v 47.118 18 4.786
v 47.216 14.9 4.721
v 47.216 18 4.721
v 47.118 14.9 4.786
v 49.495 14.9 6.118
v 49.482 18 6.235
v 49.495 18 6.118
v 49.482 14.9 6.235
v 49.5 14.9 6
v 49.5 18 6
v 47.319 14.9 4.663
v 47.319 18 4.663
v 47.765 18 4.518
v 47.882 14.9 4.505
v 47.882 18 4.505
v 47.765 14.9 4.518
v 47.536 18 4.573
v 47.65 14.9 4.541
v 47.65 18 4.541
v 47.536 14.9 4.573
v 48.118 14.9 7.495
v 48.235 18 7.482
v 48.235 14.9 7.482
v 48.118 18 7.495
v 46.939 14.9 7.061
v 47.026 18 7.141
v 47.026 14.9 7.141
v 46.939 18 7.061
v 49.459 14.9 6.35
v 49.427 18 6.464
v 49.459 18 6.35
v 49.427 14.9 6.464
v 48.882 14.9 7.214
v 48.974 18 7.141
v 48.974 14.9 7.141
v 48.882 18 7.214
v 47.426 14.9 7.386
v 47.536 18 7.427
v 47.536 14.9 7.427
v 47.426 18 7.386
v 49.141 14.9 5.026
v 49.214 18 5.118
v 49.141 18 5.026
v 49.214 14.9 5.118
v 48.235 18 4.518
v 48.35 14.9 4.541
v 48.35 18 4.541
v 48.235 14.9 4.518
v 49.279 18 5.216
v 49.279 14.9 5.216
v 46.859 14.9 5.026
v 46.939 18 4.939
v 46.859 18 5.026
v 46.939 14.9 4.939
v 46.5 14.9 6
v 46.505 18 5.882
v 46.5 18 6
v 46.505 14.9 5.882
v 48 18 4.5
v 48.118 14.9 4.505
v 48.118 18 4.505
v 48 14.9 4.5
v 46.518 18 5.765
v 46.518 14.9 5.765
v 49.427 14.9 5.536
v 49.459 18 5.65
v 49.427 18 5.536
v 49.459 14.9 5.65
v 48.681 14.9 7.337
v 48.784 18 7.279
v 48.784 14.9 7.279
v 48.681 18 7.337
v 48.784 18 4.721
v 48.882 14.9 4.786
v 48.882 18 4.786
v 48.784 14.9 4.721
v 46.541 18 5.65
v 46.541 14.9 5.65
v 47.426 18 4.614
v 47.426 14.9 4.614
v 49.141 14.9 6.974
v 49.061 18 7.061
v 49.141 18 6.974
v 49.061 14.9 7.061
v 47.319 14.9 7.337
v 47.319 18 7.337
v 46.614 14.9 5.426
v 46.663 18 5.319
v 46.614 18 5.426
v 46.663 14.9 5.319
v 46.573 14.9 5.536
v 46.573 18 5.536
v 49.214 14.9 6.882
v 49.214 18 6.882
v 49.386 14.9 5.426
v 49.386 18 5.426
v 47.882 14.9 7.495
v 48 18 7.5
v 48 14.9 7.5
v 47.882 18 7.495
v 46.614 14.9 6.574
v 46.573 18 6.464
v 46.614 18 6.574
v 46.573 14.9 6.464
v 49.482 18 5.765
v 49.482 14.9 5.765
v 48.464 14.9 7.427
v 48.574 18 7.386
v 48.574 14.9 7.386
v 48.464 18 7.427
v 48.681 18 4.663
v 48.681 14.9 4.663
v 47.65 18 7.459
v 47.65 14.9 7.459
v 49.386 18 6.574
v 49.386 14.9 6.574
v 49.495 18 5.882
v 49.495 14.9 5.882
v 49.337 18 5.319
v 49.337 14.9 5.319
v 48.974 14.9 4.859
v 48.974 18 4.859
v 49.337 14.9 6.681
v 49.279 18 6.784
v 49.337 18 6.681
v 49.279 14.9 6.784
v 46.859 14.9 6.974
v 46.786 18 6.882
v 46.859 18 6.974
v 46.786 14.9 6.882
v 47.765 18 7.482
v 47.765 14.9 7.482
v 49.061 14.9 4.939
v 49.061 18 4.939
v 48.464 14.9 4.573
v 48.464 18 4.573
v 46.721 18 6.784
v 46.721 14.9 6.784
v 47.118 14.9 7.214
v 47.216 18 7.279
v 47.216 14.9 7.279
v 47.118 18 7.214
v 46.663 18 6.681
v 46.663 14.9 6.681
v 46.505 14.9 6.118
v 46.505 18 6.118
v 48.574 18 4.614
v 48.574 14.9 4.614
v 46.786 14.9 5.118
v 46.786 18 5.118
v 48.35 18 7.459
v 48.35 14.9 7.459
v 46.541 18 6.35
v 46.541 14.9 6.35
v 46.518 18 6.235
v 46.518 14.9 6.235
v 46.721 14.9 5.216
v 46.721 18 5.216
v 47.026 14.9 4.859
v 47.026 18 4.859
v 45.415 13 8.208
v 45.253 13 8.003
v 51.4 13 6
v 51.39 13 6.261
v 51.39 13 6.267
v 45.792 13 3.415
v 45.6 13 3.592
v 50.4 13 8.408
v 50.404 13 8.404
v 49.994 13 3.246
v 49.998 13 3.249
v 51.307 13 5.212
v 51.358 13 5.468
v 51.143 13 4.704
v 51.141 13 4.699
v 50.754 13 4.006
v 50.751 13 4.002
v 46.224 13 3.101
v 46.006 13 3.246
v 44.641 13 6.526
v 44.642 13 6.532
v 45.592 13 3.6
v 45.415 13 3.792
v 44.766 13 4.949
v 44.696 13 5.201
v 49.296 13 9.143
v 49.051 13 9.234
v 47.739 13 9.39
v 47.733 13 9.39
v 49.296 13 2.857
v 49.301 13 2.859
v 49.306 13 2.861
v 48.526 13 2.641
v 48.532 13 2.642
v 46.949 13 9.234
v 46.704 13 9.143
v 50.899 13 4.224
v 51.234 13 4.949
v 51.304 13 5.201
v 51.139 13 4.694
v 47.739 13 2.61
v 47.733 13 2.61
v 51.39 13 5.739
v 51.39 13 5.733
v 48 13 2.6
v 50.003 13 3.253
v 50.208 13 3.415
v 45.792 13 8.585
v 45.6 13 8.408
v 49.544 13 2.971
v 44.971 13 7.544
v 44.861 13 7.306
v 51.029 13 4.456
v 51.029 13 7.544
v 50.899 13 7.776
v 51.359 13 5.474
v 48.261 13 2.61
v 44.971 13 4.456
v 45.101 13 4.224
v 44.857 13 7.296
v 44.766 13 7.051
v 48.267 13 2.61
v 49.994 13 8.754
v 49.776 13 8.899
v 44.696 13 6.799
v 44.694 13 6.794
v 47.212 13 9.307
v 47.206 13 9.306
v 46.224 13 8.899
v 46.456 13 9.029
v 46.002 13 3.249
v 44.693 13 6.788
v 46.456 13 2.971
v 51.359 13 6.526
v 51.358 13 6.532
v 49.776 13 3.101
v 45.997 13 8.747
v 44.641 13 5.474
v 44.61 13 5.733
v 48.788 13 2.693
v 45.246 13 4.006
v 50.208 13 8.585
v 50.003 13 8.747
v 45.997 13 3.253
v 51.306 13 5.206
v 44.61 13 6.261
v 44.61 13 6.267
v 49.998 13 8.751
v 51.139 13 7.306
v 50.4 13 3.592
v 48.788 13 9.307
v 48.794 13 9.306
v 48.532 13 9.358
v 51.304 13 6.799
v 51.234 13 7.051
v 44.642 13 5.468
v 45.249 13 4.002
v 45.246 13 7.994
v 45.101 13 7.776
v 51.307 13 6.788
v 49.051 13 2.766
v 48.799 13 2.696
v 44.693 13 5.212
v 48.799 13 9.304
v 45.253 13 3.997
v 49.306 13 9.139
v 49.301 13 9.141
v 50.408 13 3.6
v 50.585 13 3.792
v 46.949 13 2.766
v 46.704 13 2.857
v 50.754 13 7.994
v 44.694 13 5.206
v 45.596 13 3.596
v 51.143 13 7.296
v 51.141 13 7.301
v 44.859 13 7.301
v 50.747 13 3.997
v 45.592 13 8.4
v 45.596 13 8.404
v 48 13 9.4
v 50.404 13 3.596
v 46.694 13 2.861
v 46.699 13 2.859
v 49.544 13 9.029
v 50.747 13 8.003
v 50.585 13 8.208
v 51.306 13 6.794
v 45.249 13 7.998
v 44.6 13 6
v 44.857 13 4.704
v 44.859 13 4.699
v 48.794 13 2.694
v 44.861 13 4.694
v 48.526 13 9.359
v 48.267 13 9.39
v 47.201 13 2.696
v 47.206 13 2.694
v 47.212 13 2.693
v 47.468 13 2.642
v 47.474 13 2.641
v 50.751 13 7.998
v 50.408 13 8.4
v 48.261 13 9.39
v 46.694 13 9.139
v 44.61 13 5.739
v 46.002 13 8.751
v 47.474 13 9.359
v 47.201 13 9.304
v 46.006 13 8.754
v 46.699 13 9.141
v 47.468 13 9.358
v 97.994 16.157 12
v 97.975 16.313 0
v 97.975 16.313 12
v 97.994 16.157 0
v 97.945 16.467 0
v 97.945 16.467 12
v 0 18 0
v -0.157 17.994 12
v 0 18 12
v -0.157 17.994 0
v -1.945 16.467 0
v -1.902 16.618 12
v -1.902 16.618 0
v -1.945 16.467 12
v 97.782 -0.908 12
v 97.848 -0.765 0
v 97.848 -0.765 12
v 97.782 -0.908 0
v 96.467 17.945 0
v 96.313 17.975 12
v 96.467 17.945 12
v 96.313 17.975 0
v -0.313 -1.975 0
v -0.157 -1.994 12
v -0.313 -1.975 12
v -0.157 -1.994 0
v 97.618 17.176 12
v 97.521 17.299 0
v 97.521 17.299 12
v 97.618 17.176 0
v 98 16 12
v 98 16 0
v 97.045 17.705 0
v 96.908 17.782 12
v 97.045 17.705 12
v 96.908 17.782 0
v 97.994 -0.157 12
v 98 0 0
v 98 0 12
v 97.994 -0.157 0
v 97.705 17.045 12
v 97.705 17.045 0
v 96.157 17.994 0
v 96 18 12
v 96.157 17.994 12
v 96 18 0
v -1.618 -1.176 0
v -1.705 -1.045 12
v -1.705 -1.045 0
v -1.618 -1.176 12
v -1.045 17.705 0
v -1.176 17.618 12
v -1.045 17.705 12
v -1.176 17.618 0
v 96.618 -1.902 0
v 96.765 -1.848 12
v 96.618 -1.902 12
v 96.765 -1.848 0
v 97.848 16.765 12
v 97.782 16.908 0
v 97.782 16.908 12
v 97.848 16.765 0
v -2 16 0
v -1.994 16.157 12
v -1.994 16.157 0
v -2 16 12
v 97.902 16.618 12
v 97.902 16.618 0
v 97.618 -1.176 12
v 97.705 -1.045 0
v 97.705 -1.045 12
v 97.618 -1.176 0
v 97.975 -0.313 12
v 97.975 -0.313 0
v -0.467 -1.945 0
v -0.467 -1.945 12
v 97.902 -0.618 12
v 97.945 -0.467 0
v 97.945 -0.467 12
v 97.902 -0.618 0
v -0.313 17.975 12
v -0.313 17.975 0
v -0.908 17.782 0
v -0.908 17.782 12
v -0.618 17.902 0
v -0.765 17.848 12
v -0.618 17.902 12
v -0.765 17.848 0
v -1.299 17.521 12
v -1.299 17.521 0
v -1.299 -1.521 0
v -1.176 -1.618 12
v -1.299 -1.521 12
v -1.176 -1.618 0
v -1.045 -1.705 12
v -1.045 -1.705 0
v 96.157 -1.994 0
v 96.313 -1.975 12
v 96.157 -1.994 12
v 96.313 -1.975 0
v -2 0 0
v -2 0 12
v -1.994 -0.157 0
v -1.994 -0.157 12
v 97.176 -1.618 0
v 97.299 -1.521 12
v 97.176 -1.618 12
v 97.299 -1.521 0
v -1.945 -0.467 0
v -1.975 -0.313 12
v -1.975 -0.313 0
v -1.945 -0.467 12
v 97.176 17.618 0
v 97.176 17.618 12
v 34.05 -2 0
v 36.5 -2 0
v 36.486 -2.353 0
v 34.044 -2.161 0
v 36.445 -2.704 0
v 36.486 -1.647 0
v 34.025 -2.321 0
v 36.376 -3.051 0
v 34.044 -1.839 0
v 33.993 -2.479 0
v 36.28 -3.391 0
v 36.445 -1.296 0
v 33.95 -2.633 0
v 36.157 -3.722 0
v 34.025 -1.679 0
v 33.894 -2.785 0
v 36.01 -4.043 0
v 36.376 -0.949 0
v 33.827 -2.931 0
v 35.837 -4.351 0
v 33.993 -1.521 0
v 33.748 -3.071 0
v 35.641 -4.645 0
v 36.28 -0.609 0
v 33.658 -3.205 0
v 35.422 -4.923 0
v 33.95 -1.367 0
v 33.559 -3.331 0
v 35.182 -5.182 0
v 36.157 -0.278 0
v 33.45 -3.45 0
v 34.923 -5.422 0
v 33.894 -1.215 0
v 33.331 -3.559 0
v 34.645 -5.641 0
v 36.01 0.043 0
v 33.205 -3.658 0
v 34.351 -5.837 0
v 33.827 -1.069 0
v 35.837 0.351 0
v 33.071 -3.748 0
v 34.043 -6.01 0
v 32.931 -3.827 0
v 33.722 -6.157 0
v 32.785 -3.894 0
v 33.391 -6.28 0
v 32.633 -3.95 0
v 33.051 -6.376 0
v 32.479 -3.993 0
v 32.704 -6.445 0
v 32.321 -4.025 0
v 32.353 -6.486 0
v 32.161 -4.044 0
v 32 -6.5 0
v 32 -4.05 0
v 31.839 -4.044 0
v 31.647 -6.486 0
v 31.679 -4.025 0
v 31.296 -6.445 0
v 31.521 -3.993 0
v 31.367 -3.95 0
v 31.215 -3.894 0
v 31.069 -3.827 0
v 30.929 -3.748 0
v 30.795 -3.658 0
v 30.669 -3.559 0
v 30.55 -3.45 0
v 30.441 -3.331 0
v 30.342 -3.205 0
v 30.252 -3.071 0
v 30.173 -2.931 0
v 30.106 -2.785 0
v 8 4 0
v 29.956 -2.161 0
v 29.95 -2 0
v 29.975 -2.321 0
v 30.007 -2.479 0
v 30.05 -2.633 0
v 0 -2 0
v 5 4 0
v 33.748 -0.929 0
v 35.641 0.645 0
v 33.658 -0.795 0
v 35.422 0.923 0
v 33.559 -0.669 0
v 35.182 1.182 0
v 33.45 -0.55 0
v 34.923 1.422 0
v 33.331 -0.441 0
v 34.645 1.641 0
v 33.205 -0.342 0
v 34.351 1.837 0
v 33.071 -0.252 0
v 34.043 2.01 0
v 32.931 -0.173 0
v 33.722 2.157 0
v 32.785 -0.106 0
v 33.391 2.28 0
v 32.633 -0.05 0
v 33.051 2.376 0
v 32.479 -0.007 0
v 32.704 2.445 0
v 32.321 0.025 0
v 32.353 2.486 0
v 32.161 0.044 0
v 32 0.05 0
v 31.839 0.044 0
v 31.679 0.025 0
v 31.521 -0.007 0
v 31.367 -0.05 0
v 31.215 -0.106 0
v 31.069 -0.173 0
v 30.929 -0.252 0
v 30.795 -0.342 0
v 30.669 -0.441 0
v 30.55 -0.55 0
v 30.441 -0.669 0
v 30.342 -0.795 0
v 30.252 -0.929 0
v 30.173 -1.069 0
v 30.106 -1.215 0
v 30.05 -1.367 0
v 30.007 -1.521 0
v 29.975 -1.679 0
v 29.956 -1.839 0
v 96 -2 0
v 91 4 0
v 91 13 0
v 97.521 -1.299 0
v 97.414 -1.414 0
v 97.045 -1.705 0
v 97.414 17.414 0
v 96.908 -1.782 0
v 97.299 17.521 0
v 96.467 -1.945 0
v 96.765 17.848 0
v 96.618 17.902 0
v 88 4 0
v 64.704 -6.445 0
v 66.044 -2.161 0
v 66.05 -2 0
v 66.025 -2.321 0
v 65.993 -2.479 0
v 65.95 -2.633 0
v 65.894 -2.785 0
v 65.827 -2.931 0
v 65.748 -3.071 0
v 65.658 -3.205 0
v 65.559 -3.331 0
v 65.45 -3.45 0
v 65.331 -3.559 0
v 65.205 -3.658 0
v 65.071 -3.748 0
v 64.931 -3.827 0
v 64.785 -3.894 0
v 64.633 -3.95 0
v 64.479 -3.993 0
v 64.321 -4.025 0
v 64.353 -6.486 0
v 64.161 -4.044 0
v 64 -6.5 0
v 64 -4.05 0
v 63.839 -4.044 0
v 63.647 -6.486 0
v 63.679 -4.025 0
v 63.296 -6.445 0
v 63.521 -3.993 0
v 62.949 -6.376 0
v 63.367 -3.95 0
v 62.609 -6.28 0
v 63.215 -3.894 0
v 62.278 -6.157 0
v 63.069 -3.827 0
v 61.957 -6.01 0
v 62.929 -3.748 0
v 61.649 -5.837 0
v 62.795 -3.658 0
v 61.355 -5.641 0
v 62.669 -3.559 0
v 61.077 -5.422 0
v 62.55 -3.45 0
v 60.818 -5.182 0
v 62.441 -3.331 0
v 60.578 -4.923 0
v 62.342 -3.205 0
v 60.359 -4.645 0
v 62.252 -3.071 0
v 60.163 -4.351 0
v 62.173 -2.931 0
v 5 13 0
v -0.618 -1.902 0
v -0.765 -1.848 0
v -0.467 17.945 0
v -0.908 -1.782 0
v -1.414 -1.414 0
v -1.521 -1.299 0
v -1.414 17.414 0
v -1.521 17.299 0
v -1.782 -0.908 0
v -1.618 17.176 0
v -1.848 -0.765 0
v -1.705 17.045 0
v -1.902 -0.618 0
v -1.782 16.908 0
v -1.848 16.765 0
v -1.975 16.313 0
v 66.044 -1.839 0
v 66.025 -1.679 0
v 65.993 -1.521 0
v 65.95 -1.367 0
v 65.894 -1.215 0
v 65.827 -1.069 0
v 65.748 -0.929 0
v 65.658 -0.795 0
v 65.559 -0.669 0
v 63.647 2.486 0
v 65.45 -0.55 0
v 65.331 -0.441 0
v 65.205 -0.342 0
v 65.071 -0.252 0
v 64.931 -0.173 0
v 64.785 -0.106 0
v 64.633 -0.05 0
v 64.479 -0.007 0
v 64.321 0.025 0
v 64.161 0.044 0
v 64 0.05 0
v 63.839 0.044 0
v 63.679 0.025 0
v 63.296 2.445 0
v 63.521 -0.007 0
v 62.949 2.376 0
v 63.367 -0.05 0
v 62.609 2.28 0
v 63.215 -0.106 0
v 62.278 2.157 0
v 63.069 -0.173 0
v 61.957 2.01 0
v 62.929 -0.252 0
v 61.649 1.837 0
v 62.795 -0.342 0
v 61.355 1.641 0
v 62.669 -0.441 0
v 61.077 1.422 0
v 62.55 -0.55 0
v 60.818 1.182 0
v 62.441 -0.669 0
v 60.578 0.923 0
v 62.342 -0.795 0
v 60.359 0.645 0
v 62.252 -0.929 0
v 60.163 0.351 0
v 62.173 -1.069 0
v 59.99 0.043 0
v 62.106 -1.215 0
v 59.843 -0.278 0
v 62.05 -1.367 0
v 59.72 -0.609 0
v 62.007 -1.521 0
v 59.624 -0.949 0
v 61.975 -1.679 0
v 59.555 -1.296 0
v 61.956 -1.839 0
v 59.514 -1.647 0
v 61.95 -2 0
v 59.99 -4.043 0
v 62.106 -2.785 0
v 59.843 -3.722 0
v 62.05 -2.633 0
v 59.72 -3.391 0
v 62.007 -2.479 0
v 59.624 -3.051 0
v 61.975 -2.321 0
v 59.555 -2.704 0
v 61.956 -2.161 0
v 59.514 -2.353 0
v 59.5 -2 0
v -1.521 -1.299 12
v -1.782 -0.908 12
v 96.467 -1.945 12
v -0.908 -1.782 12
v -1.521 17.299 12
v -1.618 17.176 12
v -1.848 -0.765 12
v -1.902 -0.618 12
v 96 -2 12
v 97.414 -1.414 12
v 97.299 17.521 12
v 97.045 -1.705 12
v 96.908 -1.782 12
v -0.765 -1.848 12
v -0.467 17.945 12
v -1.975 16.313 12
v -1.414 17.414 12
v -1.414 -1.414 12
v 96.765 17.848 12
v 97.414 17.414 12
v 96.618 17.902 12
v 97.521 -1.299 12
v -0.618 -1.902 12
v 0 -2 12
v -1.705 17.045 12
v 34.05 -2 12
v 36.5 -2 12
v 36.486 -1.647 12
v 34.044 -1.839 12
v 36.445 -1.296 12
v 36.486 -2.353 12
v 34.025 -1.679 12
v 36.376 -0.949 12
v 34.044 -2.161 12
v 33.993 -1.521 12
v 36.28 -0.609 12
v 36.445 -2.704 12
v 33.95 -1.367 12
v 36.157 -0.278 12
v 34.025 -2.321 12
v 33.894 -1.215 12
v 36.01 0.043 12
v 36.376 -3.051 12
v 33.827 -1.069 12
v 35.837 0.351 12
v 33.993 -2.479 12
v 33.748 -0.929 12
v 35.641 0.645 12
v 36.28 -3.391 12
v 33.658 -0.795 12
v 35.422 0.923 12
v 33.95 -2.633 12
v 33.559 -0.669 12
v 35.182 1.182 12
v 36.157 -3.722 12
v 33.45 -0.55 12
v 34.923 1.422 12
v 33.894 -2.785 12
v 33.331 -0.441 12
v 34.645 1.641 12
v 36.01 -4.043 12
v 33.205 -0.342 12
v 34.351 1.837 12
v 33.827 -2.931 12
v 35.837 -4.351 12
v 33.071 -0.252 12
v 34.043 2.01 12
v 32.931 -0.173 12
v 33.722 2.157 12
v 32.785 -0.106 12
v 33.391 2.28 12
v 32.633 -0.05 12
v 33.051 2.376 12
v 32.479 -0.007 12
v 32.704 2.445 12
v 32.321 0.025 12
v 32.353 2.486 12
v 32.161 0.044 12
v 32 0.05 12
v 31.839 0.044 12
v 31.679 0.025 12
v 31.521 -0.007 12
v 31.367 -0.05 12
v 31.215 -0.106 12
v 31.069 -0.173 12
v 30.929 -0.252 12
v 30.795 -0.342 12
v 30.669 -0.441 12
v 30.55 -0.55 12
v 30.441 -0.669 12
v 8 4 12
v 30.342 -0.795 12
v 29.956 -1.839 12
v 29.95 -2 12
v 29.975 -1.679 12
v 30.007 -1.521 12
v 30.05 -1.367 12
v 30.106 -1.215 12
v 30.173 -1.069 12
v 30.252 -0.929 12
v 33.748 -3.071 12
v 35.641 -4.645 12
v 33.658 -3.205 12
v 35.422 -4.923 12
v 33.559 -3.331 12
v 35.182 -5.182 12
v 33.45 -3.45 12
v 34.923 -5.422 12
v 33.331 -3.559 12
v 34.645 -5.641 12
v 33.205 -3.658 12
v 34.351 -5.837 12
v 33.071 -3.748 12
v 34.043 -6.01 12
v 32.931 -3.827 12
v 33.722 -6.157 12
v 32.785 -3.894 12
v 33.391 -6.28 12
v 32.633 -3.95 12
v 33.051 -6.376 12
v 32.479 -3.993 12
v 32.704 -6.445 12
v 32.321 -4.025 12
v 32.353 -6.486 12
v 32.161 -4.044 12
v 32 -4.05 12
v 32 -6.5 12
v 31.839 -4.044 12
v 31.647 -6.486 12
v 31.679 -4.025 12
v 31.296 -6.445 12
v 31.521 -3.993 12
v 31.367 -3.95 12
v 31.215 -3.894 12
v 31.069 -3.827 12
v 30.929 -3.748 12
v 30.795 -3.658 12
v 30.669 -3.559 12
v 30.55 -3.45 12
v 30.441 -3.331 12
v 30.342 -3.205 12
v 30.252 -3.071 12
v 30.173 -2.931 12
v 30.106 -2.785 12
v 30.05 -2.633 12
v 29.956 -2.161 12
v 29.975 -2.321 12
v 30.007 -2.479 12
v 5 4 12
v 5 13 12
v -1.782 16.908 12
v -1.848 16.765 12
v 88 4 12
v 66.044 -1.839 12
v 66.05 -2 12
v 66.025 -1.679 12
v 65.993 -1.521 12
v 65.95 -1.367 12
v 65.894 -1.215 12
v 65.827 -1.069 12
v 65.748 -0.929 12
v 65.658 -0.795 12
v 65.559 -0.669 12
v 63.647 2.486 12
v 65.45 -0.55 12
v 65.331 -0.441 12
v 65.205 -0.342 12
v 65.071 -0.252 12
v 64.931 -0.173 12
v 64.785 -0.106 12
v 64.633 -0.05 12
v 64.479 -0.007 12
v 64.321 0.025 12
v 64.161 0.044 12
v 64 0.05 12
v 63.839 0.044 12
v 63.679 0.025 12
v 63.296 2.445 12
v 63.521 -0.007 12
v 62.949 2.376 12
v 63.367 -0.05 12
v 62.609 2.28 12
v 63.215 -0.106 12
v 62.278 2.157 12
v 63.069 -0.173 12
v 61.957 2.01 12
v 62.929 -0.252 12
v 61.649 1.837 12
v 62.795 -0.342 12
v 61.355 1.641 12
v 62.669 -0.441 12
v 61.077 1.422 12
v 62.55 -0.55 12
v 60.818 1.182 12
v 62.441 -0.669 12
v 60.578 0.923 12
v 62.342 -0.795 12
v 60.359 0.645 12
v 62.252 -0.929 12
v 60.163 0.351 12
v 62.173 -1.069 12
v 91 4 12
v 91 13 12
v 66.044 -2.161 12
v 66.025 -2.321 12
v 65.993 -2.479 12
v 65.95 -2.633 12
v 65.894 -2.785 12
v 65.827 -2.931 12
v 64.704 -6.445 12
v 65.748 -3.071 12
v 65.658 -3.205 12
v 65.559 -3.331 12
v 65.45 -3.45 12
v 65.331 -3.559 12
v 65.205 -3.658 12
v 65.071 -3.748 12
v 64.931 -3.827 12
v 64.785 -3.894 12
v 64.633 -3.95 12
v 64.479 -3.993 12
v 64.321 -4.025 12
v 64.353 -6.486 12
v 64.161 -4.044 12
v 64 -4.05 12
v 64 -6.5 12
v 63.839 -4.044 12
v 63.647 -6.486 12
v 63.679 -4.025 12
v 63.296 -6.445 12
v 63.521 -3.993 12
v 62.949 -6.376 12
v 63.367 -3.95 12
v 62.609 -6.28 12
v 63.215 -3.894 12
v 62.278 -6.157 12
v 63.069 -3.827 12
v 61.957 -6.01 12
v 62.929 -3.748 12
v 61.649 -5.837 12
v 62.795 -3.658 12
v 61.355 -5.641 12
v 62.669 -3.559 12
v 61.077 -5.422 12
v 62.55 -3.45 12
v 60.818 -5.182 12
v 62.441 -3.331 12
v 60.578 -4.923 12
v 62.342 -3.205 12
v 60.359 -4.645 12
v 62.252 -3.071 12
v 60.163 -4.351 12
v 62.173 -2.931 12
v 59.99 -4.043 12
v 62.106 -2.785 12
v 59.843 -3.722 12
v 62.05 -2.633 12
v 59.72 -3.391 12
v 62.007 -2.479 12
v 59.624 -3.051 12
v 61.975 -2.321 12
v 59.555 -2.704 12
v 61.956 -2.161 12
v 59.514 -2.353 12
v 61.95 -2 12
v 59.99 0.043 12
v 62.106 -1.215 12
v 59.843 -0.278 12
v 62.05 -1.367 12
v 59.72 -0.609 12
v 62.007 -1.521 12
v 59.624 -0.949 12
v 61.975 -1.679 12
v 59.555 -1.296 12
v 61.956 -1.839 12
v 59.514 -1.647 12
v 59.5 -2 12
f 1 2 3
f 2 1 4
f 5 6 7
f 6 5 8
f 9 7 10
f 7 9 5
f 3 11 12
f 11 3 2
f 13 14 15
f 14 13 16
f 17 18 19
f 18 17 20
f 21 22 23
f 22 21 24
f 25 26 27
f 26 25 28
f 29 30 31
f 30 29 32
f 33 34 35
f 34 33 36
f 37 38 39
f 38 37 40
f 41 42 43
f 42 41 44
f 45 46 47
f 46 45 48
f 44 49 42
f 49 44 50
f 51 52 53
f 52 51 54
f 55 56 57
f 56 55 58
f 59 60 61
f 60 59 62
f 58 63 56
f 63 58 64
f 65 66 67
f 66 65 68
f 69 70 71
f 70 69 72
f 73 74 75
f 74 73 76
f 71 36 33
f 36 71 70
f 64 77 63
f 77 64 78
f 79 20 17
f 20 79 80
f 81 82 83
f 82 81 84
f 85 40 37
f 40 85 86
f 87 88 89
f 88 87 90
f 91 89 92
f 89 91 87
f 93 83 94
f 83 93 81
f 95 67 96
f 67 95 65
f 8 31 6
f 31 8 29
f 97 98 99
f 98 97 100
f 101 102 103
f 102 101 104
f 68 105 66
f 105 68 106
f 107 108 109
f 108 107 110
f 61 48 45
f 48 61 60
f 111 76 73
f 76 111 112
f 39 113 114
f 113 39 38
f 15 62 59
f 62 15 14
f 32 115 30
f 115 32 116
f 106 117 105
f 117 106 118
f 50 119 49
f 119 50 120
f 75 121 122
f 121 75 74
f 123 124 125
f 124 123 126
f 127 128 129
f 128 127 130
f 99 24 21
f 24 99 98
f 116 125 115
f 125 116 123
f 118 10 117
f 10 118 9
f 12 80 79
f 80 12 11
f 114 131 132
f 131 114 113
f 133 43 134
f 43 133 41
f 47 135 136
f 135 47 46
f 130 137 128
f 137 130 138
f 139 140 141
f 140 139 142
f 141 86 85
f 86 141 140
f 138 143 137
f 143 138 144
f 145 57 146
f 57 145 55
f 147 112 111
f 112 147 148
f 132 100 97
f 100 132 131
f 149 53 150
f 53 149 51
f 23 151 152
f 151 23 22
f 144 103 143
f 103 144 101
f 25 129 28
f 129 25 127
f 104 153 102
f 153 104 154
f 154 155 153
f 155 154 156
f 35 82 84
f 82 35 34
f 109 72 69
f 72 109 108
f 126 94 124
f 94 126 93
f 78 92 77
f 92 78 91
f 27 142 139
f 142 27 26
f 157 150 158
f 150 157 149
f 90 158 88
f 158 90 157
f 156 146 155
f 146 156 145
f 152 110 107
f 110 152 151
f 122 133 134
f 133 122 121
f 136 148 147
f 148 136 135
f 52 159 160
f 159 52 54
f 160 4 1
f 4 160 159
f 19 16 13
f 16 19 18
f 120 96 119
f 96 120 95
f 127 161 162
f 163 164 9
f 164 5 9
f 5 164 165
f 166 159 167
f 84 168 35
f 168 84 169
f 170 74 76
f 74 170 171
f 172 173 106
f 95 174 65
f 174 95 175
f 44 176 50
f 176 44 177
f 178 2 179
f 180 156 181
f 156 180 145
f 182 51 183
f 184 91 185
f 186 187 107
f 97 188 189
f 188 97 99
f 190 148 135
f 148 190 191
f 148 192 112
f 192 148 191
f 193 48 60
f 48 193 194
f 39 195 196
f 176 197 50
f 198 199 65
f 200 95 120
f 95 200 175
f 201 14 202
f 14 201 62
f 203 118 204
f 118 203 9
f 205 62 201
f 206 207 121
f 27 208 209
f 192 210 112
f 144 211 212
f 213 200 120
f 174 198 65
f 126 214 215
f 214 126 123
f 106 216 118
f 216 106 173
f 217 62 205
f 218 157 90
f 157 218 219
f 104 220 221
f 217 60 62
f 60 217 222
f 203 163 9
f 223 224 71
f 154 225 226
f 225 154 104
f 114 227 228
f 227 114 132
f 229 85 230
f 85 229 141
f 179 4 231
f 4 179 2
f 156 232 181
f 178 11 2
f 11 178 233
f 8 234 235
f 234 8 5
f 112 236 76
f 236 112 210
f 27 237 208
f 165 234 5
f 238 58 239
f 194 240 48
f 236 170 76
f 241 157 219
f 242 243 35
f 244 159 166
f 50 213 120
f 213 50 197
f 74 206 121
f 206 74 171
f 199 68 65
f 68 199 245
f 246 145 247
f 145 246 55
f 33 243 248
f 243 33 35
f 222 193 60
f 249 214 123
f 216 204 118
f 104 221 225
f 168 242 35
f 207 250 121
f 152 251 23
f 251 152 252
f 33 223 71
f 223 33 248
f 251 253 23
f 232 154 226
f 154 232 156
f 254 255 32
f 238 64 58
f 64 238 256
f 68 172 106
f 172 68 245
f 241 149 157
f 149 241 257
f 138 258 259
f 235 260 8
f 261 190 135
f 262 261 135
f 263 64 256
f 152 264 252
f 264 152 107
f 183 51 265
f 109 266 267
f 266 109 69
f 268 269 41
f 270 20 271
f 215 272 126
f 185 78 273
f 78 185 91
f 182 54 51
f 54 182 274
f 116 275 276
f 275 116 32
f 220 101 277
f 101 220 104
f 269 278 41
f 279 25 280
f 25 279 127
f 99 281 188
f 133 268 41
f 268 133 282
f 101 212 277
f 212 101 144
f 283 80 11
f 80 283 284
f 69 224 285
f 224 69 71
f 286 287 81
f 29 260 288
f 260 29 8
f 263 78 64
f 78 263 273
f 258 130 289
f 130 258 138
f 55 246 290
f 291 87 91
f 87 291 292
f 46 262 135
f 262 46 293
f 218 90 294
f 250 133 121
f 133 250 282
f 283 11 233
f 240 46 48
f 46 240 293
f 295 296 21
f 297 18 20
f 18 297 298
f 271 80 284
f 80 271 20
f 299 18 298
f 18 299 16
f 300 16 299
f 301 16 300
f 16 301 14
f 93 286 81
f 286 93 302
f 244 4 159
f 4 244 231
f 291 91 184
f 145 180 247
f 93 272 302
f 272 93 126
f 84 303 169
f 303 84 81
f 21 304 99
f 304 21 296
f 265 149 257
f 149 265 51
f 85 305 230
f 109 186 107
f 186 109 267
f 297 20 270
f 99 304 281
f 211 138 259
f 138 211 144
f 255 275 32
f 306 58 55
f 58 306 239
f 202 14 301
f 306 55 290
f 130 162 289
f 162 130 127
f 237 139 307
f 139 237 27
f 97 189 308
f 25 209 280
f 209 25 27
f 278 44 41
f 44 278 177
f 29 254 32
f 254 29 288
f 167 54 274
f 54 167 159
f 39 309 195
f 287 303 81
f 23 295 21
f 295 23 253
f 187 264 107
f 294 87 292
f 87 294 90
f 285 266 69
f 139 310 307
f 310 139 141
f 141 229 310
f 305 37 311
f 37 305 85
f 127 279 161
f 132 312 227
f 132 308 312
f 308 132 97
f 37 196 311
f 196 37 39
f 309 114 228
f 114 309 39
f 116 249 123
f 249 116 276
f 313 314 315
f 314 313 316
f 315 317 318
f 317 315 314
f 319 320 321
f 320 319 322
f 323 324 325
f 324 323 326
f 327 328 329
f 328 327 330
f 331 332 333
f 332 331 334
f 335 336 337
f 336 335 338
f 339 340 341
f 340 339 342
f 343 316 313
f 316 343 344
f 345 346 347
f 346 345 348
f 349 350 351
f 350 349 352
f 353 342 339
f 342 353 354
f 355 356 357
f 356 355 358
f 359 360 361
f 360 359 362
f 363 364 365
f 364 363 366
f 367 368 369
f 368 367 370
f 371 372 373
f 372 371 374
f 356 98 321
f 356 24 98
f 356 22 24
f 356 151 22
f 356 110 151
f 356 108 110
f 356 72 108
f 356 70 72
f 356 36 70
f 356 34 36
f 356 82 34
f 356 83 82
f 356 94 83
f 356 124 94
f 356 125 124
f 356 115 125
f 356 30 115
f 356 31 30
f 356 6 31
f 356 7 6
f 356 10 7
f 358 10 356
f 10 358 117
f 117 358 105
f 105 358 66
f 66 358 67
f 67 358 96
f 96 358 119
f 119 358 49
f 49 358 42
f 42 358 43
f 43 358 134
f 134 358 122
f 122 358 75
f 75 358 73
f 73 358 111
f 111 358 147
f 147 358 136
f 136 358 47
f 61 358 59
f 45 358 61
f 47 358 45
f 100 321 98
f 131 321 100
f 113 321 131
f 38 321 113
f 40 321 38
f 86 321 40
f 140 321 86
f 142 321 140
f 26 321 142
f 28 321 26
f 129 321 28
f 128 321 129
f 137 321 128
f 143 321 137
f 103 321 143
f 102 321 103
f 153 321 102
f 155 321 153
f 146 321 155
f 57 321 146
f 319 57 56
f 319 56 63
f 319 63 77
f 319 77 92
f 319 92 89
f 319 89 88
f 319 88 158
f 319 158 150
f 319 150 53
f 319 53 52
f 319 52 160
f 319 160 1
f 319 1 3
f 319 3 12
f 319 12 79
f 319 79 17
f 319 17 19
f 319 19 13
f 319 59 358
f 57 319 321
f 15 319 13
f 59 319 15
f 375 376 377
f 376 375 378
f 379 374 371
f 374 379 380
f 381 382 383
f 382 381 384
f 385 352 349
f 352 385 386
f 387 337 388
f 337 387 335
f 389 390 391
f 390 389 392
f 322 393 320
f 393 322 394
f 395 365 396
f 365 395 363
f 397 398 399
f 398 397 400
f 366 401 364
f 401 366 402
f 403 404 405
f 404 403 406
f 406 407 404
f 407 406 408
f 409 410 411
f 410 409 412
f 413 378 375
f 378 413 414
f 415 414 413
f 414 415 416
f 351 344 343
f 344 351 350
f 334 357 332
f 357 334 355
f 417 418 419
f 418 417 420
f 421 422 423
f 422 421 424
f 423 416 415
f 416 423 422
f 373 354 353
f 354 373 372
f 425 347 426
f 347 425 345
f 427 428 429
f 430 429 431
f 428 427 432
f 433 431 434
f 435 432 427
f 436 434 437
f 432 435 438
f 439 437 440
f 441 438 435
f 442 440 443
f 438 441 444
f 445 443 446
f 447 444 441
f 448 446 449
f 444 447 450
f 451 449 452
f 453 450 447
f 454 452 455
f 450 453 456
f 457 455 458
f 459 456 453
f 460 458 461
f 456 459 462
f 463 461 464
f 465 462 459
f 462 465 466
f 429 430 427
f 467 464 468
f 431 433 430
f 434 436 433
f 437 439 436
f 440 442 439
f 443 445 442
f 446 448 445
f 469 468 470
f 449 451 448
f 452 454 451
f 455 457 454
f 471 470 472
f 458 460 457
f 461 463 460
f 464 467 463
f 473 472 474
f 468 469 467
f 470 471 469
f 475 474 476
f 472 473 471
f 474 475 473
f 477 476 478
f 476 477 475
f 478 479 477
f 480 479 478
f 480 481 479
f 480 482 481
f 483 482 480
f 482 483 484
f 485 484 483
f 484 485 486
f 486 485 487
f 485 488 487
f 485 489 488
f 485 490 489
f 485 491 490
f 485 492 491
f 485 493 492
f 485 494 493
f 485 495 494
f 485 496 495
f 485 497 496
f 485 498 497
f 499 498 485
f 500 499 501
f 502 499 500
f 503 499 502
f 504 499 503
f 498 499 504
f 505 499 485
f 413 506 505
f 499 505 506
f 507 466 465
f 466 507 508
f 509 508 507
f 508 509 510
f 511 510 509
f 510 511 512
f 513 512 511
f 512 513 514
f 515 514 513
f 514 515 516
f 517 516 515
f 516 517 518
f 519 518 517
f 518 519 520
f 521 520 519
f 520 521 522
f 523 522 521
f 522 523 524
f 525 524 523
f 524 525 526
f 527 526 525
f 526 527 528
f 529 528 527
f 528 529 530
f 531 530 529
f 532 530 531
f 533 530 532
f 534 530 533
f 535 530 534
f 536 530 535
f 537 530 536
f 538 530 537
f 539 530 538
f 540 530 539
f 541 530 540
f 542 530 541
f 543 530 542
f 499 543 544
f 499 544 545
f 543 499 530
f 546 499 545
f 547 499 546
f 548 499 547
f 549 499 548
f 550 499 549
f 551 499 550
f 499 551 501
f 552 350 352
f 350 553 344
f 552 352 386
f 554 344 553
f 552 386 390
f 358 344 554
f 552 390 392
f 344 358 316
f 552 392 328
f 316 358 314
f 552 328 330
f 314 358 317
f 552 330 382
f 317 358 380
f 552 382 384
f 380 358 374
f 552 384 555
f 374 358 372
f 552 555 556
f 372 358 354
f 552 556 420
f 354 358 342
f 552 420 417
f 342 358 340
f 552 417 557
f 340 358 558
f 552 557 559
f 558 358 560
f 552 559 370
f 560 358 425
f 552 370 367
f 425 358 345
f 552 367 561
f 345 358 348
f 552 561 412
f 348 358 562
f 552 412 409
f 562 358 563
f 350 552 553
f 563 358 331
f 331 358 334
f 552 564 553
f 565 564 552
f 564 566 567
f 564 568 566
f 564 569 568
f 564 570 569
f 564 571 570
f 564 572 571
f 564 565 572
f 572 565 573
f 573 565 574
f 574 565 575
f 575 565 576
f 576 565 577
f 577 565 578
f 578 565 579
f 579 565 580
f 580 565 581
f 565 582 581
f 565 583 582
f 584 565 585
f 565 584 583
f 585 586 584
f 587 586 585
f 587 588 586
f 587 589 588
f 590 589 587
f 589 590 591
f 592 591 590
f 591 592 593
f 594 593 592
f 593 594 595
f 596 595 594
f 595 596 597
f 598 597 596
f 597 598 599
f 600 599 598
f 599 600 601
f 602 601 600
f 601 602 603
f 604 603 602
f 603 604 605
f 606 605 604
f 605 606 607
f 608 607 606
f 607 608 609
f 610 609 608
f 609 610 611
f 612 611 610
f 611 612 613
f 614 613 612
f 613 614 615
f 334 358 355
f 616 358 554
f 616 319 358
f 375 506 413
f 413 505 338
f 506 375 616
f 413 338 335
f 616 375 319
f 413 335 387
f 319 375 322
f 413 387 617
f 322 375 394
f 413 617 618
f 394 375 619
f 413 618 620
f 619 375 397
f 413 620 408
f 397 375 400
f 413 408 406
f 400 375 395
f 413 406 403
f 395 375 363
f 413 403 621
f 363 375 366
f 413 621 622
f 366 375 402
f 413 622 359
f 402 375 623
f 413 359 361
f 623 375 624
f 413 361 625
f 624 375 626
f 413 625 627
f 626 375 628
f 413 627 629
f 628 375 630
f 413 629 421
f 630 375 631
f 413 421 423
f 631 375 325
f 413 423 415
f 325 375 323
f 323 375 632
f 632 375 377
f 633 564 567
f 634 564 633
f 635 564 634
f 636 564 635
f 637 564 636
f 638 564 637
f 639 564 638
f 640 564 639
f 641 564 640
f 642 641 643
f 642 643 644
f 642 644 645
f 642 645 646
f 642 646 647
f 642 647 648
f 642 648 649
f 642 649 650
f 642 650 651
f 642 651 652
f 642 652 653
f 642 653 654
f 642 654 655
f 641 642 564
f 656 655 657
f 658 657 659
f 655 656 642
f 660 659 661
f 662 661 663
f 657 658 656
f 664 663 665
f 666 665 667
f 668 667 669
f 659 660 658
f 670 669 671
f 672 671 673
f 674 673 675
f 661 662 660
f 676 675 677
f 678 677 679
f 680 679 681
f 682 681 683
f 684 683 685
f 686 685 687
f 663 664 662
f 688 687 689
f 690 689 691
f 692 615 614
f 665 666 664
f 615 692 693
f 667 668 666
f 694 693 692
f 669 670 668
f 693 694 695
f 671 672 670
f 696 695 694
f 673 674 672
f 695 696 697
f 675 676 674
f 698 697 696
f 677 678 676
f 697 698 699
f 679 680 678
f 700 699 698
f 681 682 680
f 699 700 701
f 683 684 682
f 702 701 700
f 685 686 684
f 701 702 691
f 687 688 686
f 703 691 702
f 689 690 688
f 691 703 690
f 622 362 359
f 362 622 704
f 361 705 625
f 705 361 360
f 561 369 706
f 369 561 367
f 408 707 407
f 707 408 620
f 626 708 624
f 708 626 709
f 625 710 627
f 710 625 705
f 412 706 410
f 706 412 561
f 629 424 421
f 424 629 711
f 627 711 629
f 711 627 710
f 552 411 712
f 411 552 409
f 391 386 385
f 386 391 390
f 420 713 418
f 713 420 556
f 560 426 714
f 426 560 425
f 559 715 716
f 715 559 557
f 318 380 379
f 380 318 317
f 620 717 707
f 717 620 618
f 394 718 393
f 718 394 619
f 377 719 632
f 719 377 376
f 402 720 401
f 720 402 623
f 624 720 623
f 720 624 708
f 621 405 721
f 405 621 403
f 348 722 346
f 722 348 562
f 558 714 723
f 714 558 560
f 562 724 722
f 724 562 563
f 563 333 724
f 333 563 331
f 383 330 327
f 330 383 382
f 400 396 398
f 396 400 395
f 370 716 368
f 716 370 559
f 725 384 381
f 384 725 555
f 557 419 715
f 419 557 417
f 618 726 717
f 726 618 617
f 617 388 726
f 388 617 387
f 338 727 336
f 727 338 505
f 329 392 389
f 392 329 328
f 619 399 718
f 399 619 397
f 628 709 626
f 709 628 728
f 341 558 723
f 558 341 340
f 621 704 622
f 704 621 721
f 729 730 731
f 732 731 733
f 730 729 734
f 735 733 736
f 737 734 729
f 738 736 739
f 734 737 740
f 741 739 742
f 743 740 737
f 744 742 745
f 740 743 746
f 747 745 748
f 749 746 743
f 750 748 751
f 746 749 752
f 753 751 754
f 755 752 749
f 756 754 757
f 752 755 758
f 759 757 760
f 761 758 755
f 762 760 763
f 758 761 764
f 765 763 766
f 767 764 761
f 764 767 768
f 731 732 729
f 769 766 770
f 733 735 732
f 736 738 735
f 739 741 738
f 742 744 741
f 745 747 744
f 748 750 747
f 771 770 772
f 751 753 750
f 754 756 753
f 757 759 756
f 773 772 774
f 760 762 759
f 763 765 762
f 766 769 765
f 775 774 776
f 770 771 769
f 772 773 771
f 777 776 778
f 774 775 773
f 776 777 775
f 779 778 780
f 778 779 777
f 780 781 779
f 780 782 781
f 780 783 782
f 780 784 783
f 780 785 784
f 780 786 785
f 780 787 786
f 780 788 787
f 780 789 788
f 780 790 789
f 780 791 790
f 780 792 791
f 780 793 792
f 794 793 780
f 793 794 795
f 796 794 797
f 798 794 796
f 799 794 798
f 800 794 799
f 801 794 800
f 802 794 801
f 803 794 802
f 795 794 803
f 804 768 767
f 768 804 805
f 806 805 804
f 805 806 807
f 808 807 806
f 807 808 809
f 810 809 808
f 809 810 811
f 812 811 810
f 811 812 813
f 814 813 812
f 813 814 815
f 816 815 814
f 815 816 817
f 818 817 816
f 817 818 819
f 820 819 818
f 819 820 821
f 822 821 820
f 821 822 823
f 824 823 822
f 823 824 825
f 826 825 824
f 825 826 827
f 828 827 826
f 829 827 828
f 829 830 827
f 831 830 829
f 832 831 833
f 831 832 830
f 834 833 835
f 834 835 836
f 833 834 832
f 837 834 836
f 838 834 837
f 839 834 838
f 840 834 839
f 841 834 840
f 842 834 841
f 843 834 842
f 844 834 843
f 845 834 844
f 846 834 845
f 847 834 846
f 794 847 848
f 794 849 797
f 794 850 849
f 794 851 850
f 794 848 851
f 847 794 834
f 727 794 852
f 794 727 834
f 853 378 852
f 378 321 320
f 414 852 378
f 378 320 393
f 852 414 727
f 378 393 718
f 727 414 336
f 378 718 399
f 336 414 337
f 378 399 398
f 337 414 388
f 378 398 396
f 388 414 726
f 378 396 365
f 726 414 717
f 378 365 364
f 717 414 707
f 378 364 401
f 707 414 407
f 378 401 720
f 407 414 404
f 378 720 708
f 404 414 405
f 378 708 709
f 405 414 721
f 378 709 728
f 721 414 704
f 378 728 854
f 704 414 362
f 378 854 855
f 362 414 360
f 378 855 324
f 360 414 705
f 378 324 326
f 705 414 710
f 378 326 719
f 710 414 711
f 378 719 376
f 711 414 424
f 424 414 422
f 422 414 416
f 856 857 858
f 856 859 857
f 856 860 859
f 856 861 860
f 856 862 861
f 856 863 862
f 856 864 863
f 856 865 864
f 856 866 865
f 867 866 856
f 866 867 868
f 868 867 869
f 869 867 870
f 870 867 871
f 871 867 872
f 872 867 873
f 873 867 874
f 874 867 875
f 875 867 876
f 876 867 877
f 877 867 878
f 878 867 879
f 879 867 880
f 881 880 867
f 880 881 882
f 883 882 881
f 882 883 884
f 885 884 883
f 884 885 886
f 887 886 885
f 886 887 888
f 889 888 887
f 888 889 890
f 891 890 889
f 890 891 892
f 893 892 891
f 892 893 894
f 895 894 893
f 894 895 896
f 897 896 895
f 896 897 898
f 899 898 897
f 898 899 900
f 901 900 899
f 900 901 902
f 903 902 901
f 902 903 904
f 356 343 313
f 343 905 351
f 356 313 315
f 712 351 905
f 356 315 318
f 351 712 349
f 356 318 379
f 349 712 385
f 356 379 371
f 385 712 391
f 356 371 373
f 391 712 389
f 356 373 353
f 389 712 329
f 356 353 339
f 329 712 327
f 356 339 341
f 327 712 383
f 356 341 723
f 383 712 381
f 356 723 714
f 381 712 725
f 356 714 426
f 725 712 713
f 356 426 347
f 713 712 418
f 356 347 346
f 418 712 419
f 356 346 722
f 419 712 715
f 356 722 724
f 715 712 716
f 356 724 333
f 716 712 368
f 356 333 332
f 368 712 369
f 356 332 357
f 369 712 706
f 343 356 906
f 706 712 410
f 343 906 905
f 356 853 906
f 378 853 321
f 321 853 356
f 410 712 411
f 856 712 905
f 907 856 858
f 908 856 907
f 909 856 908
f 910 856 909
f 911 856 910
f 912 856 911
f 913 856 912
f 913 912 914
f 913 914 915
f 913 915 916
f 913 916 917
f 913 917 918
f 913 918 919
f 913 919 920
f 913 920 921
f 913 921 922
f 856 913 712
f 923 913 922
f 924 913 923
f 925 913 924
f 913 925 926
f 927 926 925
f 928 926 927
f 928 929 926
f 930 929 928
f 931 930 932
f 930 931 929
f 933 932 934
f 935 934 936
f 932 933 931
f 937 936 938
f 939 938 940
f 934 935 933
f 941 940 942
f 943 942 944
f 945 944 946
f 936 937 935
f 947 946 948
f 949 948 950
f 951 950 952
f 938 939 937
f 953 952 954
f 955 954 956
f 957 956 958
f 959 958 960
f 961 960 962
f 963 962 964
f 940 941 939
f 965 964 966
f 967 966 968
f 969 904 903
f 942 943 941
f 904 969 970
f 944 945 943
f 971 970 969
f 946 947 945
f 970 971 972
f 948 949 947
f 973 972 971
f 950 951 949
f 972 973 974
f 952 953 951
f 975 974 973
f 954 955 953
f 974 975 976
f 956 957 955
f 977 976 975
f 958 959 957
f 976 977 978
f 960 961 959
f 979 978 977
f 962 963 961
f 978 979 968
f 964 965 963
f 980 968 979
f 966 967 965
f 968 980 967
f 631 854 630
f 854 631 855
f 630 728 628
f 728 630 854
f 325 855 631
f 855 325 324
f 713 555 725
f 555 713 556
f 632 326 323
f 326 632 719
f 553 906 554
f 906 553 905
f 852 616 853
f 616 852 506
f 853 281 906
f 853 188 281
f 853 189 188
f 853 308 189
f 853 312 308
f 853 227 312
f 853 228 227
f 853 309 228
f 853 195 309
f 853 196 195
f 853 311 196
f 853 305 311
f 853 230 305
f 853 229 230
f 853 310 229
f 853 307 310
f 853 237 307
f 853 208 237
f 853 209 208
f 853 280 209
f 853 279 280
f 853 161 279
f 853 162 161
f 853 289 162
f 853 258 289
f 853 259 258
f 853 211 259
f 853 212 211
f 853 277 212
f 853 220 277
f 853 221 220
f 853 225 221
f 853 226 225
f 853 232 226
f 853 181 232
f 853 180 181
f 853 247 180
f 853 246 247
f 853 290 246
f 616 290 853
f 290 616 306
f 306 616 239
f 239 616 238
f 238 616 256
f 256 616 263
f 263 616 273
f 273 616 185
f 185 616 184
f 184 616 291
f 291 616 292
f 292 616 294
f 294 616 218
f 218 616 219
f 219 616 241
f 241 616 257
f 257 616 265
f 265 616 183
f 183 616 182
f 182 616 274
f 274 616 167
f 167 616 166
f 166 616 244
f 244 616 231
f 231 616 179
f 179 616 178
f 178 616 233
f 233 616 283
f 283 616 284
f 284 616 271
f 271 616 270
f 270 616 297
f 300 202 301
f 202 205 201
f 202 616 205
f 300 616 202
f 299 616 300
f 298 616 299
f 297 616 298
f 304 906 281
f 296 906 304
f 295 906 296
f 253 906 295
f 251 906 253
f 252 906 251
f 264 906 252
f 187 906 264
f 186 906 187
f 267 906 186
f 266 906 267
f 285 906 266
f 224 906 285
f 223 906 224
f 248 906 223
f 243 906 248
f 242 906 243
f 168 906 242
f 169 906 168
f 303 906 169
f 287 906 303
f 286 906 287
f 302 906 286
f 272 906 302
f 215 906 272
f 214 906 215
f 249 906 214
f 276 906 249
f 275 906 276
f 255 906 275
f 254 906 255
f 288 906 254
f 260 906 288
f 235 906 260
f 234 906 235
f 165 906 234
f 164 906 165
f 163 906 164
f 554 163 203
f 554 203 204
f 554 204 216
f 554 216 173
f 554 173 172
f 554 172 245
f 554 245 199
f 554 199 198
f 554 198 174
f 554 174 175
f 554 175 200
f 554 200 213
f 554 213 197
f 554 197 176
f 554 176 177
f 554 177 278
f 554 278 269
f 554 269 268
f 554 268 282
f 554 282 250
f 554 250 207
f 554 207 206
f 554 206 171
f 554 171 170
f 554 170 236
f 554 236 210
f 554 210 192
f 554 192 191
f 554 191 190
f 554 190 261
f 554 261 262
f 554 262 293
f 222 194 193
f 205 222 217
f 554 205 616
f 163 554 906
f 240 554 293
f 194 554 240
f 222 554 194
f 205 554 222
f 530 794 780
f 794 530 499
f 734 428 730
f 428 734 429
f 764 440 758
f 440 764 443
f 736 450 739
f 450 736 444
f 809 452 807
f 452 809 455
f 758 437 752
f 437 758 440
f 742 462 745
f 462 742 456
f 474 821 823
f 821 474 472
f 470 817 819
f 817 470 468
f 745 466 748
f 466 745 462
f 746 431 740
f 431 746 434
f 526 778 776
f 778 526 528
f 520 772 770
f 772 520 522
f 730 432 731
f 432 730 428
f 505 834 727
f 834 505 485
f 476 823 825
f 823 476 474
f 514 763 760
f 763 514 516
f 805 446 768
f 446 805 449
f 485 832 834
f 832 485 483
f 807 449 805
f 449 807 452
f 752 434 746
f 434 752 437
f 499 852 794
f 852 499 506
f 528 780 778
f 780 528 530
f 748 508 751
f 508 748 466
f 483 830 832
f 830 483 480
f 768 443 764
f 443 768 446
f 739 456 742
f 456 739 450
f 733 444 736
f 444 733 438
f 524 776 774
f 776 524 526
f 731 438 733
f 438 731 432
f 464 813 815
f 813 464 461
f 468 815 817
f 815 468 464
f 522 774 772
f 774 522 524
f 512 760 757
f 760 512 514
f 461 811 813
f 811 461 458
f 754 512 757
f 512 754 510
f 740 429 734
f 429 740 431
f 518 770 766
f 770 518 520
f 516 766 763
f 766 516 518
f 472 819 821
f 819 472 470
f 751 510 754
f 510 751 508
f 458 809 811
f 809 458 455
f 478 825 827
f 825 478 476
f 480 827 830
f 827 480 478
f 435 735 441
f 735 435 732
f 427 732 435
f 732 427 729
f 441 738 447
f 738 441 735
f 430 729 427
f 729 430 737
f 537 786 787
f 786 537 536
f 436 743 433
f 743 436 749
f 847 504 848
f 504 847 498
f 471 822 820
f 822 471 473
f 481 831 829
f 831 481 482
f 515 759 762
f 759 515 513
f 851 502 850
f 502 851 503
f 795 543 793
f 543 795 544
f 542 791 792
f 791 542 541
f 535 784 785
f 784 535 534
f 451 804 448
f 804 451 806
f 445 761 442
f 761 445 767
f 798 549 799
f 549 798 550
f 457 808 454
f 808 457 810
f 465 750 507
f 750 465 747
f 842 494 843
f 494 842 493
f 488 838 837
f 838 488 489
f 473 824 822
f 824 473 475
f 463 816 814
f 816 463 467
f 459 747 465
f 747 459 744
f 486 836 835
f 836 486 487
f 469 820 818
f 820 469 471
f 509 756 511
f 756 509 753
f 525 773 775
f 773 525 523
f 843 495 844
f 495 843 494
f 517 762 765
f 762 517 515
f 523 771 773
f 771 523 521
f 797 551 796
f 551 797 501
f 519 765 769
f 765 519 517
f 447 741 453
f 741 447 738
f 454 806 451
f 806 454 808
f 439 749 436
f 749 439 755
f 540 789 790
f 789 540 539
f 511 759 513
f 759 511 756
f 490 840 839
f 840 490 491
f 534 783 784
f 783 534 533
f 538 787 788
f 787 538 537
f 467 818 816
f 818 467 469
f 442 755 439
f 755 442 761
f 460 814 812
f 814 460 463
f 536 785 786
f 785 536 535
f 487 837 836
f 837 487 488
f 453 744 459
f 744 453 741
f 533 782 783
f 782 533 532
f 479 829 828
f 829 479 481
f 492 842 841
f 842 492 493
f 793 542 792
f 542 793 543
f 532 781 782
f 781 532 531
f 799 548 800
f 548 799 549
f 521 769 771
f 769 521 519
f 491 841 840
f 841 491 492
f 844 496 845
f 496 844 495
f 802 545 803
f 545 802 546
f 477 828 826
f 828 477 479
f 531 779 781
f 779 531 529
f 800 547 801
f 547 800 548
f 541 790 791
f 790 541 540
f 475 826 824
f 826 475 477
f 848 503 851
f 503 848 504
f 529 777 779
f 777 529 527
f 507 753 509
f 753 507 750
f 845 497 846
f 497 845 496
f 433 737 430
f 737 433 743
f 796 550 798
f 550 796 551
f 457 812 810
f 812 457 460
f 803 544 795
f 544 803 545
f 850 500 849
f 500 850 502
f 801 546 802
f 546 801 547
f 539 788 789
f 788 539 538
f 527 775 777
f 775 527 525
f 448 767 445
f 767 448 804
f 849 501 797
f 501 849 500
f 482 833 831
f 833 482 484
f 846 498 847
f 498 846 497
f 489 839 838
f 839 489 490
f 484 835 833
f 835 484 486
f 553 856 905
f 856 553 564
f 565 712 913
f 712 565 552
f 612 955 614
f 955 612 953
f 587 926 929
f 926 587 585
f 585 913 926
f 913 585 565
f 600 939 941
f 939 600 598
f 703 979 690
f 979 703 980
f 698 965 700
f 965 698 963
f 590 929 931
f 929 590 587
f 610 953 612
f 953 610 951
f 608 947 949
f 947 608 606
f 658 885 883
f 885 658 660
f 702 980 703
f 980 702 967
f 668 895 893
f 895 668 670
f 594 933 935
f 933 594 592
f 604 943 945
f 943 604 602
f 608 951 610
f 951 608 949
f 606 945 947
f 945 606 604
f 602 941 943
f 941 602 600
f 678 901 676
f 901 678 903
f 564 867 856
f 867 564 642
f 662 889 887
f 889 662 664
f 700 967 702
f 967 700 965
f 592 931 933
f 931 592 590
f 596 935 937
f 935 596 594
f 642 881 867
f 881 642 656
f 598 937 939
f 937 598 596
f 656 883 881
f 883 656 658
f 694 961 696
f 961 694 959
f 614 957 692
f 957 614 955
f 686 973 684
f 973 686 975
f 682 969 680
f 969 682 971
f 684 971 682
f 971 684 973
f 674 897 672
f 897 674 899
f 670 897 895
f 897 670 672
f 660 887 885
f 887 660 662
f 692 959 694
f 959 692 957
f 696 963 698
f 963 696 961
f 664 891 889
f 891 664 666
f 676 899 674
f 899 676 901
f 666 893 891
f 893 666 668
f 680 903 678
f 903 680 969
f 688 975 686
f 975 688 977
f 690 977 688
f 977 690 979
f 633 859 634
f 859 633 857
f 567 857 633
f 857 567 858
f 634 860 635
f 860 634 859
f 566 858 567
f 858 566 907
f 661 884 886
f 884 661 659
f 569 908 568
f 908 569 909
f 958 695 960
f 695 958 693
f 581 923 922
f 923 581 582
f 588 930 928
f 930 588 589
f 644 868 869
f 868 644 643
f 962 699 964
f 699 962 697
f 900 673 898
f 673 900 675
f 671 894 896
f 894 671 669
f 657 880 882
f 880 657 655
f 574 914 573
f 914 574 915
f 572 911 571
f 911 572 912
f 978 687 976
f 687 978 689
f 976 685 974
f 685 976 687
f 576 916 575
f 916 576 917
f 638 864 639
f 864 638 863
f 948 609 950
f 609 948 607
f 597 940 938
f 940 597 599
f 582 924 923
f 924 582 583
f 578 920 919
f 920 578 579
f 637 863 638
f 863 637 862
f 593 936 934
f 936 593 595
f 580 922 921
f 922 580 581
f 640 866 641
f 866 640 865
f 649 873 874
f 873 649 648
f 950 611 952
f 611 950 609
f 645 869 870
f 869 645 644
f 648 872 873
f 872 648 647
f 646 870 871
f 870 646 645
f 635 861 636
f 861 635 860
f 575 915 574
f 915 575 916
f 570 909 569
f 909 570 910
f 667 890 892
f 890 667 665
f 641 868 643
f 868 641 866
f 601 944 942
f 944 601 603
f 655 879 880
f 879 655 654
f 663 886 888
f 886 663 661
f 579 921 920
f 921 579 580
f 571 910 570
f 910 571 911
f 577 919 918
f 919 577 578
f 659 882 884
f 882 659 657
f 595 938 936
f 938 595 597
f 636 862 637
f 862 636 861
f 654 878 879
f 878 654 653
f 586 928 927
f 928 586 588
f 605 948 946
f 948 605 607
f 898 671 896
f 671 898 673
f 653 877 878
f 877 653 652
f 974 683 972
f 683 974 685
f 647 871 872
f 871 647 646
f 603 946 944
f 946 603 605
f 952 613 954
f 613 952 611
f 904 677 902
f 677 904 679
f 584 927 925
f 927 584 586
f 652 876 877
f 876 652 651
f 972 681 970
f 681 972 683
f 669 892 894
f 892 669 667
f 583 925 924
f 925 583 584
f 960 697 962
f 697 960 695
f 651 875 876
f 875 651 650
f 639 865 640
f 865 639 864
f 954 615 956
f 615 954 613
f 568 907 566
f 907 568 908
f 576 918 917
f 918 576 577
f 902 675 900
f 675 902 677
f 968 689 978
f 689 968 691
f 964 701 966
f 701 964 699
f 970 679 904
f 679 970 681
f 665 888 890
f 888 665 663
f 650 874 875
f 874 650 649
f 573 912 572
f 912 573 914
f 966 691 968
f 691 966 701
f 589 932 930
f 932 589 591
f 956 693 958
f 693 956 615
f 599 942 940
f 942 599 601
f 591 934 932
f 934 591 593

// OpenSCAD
$fn=80;

wine_glass_holder_top();

//wine_glass_holder_side();
//translate([0,0,100]) wine_glass_holder_finish();
//translate([-32/2,0,50]) cylinder(d=4,h=100,center=true);
//translate([32/2,0,50]) cylinder(d=4,h=100,center=true);

module wine_glass_holder_top() {
    union() {
        difference() {
            linear_extrude(height=12, convexity=4)
                    minkowski() {
                        square([100-4,20-4]);
                        circle(d=4);
                    }
                
            translate([5,-3,-0.01]) cube([86,20-4,12.02]);
                
            translate([-2+50,16,12/2]) {
                rotate([90,0,0]) cylinder(d=3, h=10, center=true);
                translate([0,-2.1,0]) rotate([90,0,0]) cylinder(d1=3, d2=7, h=2, center=true);
            }
        }
        
        difference() {
            hull() {
                translate([0,-2,0]) cube([8,6,12]);
                translate([32,-2,0]) cylinder(d=9, h=12);
            }
            translate([32,-2,0]) cylinder(d=4.1,h=25,center=true);
        }
        difference() {    
            hull() {
                translate([100-4-8,-2,0]) cube([8,6,12]);
                translate([100-4-32,-2,0]) cylinder(d=9, h=12);
            }
            translate([100-4-32,-2,0]) cylinder(d=4.1,h=25,center=true);
        }

    }
    //translate([0,17,10]) cube([80,5,10]);
}

module wine_glass_holder_side() {    
    difference() {
        union() {
            cube([50,20,4], center=true);
            
            hull() {
                translate([-32/2,0,15/2]) rotate([3,0,0]) cylinder(d=4+3,h=15,center=true);
                translate([-32/2,6,4/2]) cylinder(d=4+3,h=4,center=true);
                translate([-32/2,-6,4/2]) cylinder(d=4+3,h=4,center=true);
            }
            
            hull() {
                translate([+32/2,0,15/2]) rotate([3,0,0]) cylinder(d=4+3,h=15,center=true);
                translate([+32/2,6,4/2]) cylinder(d=4+3,h=4,center=true);
                translate([+32/2,-6,4/2]) cylinder(d=4+3,h=4,center=true);
            }
        }
        
        cylinder(d=3,h=20,center=true);
        
        translate([0,0,1.01])cylinder(d1=3,d2=8,h=2,center=true);
        
        translate([-32/2,0,5]) rotate([3,0,0]) cylinder(d=4,h=25,center=true);
        translate([+32/2,0,5]) rotate([3,0,0]) cylinder(d=4,h=25,center=true);
    }
}

module wine_glass_holder_finish() {
    difference() {
        hull() {
            cube([42,10,10], center=true);
            translate([32/2-2,0,15]) sphere(d=10);
            translate([-32/2+2,0,15]) sphere(d=10);
        }
        
        translate([-32/2,0,0]) cylinder(d=4,h=20,center=true);
        translate([+32/2,0,0]) cylinder(d=4,h=20,center=true);
        
        translate([0,0,-5]) sphere(d=25);
    }
    
}
